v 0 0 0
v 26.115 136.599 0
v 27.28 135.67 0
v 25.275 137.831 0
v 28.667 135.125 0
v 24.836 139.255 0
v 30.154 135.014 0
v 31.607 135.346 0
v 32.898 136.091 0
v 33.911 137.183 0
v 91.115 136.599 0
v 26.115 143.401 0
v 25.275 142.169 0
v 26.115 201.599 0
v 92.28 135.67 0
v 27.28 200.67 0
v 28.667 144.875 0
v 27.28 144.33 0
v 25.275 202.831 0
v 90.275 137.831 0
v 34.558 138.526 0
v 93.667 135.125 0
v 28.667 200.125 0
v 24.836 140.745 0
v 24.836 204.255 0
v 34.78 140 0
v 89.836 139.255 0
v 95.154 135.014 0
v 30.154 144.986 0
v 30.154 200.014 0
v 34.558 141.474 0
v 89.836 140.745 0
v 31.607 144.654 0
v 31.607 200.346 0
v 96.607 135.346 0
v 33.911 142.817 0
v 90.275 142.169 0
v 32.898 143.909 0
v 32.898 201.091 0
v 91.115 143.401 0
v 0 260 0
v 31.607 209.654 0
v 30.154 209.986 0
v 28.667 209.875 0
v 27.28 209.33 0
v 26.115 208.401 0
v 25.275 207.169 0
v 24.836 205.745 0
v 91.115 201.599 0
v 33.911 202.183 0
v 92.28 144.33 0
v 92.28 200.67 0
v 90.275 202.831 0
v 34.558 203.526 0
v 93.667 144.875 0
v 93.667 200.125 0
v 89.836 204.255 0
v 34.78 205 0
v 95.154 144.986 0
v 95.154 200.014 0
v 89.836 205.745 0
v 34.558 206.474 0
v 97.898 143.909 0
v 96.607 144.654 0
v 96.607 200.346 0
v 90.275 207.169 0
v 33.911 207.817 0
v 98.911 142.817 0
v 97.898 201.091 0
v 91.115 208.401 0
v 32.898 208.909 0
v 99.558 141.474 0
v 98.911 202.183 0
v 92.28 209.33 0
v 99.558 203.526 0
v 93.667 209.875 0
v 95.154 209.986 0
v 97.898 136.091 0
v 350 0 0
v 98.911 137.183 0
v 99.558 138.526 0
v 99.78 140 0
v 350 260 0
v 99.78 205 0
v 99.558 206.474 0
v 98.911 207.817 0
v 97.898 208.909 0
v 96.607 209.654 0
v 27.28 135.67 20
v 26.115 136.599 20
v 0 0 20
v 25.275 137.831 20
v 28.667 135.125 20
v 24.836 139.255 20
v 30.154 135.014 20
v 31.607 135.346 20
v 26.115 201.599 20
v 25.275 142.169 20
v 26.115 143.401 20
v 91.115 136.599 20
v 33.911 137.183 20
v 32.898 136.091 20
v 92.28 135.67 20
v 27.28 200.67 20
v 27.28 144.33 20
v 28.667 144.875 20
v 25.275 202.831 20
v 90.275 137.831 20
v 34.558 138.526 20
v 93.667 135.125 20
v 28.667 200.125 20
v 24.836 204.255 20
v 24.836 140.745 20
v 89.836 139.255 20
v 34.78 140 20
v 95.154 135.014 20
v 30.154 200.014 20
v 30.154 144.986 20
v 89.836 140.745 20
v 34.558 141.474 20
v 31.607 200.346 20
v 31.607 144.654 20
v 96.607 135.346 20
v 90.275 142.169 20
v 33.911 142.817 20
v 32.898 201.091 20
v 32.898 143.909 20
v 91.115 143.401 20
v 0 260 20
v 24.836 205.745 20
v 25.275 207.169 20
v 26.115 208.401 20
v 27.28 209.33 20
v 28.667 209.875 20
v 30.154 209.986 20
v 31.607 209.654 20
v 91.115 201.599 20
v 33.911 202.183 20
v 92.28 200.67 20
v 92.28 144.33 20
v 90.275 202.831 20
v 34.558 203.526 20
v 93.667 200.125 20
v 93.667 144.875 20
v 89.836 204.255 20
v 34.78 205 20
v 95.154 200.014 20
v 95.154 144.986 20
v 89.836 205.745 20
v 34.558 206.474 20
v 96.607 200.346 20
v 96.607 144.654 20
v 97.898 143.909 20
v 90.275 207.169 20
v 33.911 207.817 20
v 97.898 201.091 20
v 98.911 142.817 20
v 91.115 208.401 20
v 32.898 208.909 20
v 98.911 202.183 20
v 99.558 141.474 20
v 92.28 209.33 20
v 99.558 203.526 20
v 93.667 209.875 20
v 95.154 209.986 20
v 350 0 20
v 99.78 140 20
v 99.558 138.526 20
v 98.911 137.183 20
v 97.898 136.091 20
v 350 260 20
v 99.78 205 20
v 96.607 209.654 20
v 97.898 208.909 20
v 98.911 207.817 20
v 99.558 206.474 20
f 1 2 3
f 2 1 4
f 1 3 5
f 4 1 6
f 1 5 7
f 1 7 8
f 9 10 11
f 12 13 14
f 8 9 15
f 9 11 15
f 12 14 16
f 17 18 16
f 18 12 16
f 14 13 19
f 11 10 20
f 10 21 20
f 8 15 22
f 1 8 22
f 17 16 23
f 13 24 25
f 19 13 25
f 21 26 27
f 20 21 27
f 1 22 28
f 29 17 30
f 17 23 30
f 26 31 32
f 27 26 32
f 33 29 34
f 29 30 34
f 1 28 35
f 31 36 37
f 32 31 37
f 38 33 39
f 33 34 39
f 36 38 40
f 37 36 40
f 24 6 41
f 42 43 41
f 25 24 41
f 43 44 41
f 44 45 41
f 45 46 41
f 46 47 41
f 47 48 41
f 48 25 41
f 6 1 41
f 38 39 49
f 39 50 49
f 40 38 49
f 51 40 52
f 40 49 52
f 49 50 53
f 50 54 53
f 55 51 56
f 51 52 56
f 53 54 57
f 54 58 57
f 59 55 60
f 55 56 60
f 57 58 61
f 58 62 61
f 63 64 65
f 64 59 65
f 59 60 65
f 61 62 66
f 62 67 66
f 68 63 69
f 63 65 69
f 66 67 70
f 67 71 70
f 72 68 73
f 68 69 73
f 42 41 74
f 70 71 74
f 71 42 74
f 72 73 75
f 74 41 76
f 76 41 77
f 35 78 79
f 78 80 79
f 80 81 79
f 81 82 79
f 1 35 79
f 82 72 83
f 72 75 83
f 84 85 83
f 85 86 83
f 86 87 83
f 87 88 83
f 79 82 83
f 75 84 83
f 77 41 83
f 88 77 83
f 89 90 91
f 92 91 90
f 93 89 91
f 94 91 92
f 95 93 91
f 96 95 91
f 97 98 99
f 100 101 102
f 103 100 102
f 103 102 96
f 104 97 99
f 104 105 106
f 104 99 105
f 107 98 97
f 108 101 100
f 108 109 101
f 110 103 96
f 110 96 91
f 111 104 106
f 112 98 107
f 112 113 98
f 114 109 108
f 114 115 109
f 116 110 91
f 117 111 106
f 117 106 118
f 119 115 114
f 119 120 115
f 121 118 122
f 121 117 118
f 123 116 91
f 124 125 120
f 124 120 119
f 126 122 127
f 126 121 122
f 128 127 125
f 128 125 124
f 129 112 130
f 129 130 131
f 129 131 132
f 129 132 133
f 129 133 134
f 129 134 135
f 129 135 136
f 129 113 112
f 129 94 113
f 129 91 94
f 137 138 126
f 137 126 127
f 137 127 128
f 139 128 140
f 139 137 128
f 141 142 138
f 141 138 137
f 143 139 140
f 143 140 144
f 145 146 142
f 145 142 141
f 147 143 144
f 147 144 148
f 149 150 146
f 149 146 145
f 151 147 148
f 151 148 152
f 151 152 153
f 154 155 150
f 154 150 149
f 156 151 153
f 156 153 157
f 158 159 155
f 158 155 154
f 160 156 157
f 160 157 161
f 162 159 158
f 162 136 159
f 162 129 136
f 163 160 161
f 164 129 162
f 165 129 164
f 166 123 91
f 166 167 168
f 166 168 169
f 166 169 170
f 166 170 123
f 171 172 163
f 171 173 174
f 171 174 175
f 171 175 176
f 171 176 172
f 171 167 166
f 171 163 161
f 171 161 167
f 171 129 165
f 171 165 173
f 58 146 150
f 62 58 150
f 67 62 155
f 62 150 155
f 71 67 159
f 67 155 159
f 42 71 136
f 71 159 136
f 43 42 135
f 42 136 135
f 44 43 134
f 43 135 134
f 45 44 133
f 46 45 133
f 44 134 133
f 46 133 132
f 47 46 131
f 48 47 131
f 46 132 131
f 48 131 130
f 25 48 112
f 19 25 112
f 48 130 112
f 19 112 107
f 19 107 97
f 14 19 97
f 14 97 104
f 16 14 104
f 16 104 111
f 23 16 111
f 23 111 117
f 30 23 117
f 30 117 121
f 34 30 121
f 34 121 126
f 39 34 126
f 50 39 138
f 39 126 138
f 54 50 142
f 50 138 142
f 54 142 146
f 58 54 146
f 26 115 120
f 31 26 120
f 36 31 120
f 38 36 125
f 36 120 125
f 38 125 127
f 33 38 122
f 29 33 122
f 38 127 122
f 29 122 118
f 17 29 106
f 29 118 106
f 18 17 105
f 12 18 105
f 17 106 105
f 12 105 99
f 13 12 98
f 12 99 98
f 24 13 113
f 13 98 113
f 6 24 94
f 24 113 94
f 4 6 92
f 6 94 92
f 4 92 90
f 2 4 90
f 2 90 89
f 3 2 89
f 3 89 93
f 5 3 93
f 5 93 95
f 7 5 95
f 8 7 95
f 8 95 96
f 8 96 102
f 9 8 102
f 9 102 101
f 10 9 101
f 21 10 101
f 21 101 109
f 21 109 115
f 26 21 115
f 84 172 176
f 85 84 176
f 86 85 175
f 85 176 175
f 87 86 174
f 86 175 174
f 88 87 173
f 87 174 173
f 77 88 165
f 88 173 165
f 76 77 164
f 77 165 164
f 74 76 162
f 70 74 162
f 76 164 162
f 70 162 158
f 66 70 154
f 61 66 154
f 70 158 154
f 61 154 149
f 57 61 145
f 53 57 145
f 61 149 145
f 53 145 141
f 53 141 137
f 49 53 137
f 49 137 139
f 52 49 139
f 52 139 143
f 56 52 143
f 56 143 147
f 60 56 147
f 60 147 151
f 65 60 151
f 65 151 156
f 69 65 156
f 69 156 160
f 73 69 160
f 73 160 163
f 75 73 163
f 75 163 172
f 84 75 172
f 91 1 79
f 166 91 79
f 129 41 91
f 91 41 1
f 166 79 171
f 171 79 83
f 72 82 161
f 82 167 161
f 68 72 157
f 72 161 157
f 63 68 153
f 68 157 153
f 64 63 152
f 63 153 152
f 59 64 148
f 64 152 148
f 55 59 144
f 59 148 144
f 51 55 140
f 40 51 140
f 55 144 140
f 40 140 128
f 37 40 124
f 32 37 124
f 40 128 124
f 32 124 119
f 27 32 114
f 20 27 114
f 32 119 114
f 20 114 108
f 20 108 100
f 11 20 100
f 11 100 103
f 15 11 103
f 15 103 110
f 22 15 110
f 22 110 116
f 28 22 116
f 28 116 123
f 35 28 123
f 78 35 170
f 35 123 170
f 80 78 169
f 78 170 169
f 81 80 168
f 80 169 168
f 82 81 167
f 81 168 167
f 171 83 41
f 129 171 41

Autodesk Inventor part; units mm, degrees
ref_plane "YZ Plane" through (0, 0, 0) normal (1, 0, 0) x (0, 1, 0)
ref_plane "XZ Plane" through (0, 0, 0) normal (0, 1, 0) x (-1, 0, 0)
ref_plane "XY Plane" through (0, 0, 0) normal (0, 0, 1) x (1, 0, 0)
sketch "Sketch1" plane through (0, 0, 0) normal (0, 0, 1) x (1, 0, 0)
  line L0 (0, 0) -> (350, 0)
  line L1 (350, 0) -> (350, 260)
  line L2 (350, 260) -> (0, 260)
  line L3 (0, 260) -> (0, 0)
  dimension "d0" = 350
  dimension "d1" = 260
extrude "Extrusion1" add sketch "Sketch1" along normal blind 20
sketch "Sketch2" plane through (0, 0, 20) normal (0, 0, 1) x (1, 0, 0)
  line L0 (0, 0) -> (30, 0)
  line L1 (0, 0) -> (350, 0) projected
  line L2 (30, 0) -> (30, 260)
  dimension "d4" = 30
sketch "Sketch3" plane through (0, 0, 20) normal (0, 0, 1) x (1, 0, 0)
  line L0 (0, 0) -> (0, 55)
  line L1 (0, 260) -> (0, 0) projected
  line L2 (0, 55) -> (31, 55)
  line L3 (0, 260) -> (0, 210)
  dimension "d5" = 55
sketch "Sketch4" plane through (0, 0, 20) normal (0, 0, 1) x (1, 0, 0)
  line L0 (350, 260) -> (0, 260) projected
  line L1 (0, 260) -> (0, 205)
  line L2 (0, 260) -> (0, 0) projected
  line L3 (0, 205) -> (29.7801, 205)
  line L4 (29.7801, 205) -> (94.7801, 205)
  line L5 (94.7801, 205) -> (94.7801, 140)
  line L6 (94.7801, 140) -> (29.7801, 140)
  circle A0 centre (29.7801, 205) radius 5
  circle A1 centre (29.7801, 140) radius 5
  circle A2 centre (94.7801, 140) radius 5
  circle A3 centre (94.7801, 205) radius 5
  dimension "d6" = 55
  dimension "d7" = 65
  dimension "d8" = 65
  dimension "d9" = 10
  dimension "d10" = 10
  dimension "d11" = 10
  dimension "d12" = 10
extrude "Extrusion2" cut sketch "Sketch4" against normal through all
properties part number "base1"
